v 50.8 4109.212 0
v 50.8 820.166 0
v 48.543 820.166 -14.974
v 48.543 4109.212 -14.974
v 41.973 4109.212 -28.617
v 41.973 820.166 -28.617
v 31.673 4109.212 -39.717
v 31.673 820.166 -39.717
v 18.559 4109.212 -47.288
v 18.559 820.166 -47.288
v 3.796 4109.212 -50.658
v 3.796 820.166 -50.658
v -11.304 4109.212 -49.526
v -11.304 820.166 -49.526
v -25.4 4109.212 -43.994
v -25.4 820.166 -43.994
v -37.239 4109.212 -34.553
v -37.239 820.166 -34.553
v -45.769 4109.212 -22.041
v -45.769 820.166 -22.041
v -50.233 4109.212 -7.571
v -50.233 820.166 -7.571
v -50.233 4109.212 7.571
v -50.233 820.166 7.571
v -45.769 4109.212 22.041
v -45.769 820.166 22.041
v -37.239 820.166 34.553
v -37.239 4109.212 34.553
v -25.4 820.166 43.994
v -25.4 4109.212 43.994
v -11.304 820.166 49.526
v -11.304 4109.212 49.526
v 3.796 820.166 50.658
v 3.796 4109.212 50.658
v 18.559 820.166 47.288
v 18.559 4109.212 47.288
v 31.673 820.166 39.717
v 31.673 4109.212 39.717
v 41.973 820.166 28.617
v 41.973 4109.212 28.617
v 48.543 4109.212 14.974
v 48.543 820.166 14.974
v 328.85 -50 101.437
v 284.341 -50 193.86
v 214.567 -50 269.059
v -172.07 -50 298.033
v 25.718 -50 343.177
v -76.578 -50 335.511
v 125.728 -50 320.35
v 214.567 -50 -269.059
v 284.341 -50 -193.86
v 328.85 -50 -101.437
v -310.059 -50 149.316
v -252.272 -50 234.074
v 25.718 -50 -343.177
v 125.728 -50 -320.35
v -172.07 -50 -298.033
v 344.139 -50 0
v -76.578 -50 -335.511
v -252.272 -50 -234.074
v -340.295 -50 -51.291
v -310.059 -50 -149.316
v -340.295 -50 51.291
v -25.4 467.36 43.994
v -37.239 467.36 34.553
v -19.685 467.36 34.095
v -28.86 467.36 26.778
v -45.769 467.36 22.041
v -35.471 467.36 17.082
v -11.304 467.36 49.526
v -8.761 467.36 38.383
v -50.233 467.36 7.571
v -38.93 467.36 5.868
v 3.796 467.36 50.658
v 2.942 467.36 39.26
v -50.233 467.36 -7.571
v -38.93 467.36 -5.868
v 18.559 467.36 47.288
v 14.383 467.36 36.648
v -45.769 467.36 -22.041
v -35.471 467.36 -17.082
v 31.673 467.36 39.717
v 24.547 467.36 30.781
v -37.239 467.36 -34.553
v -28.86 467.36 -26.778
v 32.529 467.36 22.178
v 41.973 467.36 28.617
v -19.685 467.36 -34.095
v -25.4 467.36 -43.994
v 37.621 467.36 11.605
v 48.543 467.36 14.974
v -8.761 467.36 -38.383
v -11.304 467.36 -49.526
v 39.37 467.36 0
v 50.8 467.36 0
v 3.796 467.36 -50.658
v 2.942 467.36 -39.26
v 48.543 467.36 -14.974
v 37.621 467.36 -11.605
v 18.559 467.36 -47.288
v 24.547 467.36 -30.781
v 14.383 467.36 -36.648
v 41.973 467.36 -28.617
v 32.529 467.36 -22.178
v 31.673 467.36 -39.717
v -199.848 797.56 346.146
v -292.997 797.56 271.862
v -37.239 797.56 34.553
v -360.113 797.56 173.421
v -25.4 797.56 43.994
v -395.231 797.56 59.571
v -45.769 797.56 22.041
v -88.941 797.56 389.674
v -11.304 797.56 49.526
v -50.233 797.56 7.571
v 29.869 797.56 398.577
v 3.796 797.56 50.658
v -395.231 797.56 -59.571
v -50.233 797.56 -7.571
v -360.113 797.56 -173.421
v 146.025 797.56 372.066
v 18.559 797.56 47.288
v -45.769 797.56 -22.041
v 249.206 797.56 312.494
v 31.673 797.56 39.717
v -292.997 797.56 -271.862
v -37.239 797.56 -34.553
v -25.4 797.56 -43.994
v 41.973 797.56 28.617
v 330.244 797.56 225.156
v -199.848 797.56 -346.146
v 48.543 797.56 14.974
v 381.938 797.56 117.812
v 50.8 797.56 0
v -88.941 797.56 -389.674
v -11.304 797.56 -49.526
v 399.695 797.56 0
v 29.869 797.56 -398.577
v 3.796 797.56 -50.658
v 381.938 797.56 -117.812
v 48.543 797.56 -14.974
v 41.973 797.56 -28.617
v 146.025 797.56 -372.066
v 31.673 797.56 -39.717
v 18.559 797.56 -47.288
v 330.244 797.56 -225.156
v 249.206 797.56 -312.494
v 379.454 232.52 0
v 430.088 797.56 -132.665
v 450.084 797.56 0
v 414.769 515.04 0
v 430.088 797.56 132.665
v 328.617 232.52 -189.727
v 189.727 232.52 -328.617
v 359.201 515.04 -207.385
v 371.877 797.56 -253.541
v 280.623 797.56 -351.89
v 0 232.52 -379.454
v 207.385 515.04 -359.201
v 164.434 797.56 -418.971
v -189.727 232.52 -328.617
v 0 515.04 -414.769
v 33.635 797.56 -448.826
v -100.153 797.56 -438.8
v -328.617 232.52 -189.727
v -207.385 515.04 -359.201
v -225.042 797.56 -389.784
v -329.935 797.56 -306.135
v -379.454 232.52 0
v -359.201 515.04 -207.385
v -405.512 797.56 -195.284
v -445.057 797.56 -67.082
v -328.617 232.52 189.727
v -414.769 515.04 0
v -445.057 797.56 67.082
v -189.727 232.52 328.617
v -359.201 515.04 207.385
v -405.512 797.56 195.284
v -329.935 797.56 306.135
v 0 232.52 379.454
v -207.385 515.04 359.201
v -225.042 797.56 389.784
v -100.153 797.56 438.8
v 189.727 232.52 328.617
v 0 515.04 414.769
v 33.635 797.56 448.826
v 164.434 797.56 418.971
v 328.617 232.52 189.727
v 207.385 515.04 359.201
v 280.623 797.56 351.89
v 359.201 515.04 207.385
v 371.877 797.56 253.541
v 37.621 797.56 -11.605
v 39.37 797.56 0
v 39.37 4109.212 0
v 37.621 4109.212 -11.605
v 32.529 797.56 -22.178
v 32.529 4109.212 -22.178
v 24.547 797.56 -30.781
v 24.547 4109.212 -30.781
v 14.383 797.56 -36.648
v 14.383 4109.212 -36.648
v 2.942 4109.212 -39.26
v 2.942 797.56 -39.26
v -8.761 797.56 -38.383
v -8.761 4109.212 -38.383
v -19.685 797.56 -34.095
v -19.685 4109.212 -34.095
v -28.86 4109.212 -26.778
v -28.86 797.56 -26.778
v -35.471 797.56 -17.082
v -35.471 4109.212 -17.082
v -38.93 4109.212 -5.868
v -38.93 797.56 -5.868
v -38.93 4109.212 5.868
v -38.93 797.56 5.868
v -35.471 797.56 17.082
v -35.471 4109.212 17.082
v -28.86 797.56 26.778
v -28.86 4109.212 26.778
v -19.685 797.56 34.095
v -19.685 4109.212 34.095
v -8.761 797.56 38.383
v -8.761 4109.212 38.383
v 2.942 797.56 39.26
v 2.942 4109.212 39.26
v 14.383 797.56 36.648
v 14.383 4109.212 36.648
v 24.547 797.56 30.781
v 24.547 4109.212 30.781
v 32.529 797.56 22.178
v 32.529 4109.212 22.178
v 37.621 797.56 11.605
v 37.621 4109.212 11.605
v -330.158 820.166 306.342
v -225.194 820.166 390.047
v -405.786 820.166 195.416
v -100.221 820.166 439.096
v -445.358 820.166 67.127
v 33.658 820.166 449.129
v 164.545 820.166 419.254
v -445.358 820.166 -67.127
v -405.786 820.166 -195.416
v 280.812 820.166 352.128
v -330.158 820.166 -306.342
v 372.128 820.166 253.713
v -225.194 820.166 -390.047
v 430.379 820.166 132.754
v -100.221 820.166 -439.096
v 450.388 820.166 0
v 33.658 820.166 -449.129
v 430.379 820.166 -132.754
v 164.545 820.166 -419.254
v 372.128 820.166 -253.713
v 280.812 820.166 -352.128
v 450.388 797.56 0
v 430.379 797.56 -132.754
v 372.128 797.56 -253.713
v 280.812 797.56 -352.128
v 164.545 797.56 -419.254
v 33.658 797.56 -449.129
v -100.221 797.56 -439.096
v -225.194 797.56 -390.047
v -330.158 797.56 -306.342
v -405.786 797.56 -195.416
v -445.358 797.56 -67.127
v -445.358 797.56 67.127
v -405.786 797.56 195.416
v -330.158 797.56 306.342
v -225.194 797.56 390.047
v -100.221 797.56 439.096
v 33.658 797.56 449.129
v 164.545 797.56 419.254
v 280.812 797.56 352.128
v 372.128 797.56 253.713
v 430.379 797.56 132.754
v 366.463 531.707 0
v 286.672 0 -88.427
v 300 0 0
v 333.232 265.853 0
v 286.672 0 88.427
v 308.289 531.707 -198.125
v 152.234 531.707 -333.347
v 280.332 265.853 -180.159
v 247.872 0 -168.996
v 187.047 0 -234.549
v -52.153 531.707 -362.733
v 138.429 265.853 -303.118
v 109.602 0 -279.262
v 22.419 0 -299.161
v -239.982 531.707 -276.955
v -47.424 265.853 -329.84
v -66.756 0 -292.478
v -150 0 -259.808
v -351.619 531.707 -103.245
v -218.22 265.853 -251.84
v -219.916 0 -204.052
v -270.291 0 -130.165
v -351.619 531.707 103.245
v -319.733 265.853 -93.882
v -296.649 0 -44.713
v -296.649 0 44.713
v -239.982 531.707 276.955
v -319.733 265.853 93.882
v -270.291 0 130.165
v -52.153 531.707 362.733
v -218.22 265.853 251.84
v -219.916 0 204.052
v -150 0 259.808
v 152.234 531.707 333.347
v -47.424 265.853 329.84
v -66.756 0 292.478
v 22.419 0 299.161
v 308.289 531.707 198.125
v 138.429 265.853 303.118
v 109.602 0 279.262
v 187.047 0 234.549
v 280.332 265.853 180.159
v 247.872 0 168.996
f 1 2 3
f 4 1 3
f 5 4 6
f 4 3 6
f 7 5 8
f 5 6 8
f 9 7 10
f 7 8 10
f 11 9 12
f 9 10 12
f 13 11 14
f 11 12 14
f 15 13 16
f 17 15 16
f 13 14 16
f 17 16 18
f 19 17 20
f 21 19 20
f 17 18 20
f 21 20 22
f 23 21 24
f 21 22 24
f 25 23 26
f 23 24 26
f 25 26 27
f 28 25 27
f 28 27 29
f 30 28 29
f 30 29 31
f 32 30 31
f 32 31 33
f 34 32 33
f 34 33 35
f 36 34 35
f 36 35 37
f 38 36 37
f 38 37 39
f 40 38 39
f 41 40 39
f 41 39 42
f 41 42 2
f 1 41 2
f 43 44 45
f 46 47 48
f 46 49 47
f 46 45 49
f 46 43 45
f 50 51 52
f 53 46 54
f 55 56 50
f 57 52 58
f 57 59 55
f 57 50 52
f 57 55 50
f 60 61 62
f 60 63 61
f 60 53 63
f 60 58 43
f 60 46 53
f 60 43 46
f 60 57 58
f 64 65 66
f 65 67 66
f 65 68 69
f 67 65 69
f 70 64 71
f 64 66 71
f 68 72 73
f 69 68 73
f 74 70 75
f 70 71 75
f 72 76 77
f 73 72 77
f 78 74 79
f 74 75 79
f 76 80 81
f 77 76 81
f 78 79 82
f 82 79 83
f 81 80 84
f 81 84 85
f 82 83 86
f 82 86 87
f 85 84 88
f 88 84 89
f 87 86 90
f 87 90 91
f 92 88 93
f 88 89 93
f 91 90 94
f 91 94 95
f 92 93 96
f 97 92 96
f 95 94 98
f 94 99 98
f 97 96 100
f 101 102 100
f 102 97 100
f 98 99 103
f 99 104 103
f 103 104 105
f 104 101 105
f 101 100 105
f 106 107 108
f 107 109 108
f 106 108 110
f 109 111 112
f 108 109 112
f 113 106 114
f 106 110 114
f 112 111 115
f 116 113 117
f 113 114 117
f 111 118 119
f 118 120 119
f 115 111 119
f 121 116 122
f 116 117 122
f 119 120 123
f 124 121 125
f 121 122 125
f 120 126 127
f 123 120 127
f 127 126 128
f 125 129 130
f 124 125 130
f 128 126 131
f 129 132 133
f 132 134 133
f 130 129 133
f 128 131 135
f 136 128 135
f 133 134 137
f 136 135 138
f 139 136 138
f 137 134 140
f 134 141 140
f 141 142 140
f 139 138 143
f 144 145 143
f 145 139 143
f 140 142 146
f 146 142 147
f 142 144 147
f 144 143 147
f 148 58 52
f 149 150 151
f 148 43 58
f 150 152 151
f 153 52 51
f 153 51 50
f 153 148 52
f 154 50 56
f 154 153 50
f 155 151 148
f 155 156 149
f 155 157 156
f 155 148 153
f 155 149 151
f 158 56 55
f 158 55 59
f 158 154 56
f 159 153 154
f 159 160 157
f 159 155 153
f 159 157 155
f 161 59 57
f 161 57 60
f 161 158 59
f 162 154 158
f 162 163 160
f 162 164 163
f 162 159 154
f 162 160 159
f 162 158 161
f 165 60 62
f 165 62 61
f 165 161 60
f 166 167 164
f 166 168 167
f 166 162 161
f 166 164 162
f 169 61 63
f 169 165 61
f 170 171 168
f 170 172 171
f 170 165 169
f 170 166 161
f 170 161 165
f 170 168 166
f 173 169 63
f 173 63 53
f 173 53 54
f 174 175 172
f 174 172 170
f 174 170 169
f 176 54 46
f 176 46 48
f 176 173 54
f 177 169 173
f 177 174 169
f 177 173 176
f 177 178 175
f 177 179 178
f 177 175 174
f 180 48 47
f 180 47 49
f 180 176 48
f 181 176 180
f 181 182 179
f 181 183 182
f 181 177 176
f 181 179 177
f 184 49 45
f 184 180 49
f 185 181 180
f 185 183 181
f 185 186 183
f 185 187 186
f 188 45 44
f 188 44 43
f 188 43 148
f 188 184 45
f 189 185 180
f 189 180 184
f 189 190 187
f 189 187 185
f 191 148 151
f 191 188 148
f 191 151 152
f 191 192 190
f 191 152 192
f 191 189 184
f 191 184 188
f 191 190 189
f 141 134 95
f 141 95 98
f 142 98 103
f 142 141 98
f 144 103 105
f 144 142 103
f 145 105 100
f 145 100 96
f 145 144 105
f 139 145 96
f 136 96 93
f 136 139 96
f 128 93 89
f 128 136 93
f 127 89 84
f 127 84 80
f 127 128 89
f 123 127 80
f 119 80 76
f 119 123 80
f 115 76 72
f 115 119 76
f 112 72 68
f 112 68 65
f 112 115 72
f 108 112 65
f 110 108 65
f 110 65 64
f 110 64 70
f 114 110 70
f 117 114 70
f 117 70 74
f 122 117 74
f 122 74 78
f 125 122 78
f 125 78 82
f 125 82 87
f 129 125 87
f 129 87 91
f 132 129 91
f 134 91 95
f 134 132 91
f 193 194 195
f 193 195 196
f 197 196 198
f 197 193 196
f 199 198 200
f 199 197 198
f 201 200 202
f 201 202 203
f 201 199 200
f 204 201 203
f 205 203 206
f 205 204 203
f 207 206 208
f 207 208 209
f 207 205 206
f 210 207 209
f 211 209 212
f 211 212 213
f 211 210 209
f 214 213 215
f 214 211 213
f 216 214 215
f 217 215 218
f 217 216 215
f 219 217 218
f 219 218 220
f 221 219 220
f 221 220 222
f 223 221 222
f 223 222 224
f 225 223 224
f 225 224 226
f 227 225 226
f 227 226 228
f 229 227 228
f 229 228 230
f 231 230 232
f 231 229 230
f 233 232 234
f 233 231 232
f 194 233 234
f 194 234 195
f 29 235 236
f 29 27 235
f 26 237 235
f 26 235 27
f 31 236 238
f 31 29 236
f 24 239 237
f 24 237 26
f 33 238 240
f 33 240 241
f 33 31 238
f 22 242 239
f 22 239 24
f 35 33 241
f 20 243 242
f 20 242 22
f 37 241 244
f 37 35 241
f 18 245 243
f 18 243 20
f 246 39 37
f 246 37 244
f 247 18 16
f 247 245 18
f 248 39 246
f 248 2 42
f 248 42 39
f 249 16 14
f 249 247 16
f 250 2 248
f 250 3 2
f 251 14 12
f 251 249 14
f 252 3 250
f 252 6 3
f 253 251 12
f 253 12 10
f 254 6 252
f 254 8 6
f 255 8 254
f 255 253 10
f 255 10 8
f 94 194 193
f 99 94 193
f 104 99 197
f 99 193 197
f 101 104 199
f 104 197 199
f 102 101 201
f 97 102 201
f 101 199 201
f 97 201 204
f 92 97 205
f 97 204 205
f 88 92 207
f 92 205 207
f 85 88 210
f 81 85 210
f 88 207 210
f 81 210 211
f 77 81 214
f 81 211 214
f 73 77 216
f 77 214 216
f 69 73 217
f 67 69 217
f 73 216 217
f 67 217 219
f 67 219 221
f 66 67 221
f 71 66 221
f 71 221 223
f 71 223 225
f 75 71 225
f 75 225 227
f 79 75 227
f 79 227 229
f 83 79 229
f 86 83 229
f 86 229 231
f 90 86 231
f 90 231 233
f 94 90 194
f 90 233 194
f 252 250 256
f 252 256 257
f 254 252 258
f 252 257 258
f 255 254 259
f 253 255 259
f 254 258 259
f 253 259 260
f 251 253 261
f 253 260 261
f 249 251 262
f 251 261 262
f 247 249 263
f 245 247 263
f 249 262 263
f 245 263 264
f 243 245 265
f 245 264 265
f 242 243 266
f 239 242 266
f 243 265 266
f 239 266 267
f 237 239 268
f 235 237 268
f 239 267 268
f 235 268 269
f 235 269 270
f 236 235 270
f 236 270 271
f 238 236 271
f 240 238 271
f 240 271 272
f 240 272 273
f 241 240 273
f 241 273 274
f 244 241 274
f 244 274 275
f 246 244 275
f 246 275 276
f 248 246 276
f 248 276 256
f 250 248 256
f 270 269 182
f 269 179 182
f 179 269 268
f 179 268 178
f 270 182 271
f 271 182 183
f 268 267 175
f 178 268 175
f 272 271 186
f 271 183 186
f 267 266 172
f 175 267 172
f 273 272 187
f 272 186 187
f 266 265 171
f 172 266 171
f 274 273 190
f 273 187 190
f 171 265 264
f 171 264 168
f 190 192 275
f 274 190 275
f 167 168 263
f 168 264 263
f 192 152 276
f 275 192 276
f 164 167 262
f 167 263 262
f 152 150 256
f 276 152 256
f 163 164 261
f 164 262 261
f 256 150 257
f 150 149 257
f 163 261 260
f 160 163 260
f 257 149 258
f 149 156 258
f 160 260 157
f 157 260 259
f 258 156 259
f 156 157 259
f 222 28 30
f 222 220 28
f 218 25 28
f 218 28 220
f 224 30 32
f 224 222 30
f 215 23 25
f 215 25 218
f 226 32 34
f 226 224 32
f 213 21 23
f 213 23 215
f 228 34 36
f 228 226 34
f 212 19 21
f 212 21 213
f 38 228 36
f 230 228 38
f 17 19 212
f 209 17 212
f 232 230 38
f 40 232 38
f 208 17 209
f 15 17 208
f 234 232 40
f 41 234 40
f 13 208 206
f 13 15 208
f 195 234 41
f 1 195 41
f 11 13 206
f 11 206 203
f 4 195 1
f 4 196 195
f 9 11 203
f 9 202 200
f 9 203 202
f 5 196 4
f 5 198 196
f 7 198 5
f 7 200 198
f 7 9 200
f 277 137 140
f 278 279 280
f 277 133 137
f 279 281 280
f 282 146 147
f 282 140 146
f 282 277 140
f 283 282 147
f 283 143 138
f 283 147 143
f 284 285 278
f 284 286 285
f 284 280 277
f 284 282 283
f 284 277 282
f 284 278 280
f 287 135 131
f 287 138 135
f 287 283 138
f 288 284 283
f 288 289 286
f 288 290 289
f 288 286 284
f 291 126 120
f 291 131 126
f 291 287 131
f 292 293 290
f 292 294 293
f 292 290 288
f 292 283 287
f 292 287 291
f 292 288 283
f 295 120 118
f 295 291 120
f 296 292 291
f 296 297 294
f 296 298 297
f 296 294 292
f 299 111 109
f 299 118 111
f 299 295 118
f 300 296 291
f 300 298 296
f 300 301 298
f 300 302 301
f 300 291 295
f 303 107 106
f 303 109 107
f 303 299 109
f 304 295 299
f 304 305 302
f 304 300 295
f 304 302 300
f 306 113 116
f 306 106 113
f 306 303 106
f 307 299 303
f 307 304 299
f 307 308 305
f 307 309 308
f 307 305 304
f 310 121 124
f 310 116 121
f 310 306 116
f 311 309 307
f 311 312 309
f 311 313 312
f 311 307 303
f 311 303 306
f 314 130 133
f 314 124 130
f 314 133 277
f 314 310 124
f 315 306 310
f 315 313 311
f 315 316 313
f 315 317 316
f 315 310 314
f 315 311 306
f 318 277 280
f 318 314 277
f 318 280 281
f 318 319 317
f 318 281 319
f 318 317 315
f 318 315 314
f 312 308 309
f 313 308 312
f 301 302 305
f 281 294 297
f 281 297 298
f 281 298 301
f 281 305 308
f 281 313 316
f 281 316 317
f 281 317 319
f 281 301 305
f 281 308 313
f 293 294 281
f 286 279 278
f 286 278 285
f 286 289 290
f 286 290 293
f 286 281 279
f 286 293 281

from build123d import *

# Parameters (mm, degrees)
SKETCH3_R                = 450.388011064
SKETCH3_R_2              = 50.774314147
BOSS_EXTRUDE1_DEPTH      = 22.606
SKETCH4_R                = 50.8
SKETCH4_R_2              = 39.37
BOSS_EXTRUDE2_DEPTH      = 3311.652
BOSS_EXTRUDE2_DEPTH_BACK = 330.2


with BuildPart() as part:
    # Sketch2 → Revolve1 (revolve)
    with BuildSketch(Plane.XY):
        Polygon((0, 0), (0, -50.000000076), (344.139110806, -50.000000076), (450.388011064, 799.991191009), (400.000001233, 799.999999946), (299.999999948, 0), align=None)
    revolve(axis=Axis((0, -50.000000076, 0), (0, 1, 0)))

    # Sketch3 → Boss-Extrude1 (add)
    with BuildSketch(Plane(origin=(0, 797.56, 0), x_dir=(1, 0, 0), z_dir=(0, 1, 0))):
        Circle(SKETCH3_R)
        Circle(SKETCH3_R_2, mode=Mode.SUBTRACT)
    extrude(amount=BOSS_EXTRUDE1_DEPTH)

    # Sketch4 → Boss-Extrude2 (add, two sides)
    with BuildSketch(Plane(origin=(0, 797.56, 0), x_dir=(1, 0, 0), z_dir=(0, 1, 0))) as boss_extrude2_sk:
        Circle(SKETCH4_R)
        Circle(SKETCH4_R_2, mode=Mode.SUBTRACT)
    extrude(amount=BOSS_EXTRUDE2_DEPTH)
    extrude(boss_extrude2_sk.sketch, amount=-BOSS_EXTRUDE2_DEPTH_BACK)


solid = part.part
